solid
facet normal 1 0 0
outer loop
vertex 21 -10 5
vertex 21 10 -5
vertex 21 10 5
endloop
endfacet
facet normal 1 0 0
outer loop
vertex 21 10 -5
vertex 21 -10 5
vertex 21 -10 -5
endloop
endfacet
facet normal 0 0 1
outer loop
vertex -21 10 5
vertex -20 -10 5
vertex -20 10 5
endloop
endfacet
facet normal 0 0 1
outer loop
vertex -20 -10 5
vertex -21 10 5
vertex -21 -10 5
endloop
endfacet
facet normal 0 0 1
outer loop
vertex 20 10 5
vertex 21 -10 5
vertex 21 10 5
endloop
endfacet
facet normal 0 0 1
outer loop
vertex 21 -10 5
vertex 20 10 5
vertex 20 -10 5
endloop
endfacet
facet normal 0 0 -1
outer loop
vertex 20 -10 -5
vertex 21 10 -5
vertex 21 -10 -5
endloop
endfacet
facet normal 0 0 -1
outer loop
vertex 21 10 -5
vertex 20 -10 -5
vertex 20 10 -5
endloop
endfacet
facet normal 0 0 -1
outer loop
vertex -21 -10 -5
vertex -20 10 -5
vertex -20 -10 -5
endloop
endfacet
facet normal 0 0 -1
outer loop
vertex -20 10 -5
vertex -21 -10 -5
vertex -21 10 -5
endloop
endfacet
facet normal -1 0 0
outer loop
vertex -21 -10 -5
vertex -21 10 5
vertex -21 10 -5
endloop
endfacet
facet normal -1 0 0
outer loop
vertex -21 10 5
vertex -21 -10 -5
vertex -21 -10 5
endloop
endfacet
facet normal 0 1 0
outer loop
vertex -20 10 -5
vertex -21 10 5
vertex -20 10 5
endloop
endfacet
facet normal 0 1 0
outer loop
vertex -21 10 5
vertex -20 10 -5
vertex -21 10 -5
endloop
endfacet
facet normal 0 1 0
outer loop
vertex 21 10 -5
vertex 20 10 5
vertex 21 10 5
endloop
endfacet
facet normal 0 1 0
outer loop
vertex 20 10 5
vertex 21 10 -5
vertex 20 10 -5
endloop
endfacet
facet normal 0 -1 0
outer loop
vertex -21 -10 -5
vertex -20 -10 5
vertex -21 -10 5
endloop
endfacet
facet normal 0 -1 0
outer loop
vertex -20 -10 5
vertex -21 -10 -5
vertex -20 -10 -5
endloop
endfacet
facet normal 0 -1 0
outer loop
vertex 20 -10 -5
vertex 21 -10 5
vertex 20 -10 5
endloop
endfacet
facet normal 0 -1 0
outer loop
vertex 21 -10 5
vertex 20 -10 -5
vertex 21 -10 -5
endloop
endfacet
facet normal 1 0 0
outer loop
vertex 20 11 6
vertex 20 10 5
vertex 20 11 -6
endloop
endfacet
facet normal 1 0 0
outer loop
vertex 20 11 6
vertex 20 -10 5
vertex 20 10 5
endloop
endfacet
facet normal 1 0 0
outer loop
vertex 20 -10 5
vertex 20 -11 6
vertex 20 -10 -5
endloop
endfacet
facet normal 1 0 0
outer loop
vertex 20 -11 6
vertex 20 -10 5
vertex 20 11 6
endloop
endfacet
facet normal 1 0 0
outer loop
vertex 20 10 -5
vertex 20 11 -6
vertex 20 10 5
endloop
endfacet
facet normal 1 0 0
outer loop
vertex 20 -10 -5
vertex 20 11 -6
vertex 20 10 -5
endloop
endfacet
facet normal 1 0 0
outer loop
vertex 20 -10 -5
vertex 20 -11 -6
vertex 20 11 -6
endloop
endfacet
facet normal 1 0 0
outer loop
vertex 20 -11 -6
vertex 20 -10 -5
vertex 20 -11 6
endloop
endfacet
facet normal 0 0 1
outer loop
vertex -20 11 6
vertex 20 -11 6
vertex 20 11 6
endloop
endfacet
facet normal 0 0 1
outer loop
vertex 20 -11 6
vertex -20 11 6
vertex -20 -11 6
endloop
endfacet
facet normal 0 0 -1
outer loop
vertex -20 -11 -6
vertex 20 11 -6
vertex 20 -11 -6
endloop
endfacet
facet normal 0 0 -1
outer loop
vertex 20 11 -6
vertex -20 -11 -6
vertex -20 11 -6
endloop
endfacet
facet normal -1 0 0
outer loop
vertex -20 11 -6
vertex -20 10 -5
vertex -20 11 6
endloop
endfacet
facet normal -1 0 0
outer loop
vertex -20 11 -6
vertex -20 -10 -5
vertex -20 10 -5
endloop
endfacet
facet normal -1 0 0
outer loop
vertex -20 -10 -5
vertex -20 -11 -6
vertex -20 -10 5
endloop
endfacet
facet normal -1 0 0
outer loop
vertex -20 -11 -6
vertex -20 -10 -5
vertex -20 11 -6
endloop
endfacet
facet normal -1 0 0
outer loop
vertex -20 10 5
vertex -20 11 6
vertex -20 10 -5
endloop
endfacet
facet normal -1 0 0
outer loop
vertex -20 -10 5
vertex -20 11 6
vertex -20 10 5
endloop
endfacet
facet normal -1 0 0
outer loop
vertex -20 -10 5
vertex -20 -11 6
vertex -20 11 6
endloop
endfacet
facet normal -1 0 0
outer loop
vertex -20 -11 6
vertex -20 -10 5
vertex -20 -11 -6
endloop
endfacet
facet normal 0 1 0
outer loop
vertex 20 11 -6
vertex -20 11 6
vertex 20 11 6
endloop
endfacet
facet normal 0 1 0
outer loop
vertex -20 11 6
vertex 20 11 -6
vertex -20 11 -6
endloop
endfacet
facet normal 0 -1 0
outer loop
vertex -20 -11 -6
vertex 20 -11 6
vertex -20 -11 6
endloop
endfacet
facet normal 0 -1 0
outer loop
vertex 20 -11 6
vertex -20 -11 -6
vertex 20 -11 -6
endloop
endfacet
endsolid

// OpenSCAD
// Unit of length: Unit.MM
union()
{
   color(c = [1.0, 0.0, 0.0, 1.0])
   {
      cube(size = [42.0, 20.0, 10.0], center = true);
   }
   cube(size = [40.0, 22.0, 12.0], center = true);
}
